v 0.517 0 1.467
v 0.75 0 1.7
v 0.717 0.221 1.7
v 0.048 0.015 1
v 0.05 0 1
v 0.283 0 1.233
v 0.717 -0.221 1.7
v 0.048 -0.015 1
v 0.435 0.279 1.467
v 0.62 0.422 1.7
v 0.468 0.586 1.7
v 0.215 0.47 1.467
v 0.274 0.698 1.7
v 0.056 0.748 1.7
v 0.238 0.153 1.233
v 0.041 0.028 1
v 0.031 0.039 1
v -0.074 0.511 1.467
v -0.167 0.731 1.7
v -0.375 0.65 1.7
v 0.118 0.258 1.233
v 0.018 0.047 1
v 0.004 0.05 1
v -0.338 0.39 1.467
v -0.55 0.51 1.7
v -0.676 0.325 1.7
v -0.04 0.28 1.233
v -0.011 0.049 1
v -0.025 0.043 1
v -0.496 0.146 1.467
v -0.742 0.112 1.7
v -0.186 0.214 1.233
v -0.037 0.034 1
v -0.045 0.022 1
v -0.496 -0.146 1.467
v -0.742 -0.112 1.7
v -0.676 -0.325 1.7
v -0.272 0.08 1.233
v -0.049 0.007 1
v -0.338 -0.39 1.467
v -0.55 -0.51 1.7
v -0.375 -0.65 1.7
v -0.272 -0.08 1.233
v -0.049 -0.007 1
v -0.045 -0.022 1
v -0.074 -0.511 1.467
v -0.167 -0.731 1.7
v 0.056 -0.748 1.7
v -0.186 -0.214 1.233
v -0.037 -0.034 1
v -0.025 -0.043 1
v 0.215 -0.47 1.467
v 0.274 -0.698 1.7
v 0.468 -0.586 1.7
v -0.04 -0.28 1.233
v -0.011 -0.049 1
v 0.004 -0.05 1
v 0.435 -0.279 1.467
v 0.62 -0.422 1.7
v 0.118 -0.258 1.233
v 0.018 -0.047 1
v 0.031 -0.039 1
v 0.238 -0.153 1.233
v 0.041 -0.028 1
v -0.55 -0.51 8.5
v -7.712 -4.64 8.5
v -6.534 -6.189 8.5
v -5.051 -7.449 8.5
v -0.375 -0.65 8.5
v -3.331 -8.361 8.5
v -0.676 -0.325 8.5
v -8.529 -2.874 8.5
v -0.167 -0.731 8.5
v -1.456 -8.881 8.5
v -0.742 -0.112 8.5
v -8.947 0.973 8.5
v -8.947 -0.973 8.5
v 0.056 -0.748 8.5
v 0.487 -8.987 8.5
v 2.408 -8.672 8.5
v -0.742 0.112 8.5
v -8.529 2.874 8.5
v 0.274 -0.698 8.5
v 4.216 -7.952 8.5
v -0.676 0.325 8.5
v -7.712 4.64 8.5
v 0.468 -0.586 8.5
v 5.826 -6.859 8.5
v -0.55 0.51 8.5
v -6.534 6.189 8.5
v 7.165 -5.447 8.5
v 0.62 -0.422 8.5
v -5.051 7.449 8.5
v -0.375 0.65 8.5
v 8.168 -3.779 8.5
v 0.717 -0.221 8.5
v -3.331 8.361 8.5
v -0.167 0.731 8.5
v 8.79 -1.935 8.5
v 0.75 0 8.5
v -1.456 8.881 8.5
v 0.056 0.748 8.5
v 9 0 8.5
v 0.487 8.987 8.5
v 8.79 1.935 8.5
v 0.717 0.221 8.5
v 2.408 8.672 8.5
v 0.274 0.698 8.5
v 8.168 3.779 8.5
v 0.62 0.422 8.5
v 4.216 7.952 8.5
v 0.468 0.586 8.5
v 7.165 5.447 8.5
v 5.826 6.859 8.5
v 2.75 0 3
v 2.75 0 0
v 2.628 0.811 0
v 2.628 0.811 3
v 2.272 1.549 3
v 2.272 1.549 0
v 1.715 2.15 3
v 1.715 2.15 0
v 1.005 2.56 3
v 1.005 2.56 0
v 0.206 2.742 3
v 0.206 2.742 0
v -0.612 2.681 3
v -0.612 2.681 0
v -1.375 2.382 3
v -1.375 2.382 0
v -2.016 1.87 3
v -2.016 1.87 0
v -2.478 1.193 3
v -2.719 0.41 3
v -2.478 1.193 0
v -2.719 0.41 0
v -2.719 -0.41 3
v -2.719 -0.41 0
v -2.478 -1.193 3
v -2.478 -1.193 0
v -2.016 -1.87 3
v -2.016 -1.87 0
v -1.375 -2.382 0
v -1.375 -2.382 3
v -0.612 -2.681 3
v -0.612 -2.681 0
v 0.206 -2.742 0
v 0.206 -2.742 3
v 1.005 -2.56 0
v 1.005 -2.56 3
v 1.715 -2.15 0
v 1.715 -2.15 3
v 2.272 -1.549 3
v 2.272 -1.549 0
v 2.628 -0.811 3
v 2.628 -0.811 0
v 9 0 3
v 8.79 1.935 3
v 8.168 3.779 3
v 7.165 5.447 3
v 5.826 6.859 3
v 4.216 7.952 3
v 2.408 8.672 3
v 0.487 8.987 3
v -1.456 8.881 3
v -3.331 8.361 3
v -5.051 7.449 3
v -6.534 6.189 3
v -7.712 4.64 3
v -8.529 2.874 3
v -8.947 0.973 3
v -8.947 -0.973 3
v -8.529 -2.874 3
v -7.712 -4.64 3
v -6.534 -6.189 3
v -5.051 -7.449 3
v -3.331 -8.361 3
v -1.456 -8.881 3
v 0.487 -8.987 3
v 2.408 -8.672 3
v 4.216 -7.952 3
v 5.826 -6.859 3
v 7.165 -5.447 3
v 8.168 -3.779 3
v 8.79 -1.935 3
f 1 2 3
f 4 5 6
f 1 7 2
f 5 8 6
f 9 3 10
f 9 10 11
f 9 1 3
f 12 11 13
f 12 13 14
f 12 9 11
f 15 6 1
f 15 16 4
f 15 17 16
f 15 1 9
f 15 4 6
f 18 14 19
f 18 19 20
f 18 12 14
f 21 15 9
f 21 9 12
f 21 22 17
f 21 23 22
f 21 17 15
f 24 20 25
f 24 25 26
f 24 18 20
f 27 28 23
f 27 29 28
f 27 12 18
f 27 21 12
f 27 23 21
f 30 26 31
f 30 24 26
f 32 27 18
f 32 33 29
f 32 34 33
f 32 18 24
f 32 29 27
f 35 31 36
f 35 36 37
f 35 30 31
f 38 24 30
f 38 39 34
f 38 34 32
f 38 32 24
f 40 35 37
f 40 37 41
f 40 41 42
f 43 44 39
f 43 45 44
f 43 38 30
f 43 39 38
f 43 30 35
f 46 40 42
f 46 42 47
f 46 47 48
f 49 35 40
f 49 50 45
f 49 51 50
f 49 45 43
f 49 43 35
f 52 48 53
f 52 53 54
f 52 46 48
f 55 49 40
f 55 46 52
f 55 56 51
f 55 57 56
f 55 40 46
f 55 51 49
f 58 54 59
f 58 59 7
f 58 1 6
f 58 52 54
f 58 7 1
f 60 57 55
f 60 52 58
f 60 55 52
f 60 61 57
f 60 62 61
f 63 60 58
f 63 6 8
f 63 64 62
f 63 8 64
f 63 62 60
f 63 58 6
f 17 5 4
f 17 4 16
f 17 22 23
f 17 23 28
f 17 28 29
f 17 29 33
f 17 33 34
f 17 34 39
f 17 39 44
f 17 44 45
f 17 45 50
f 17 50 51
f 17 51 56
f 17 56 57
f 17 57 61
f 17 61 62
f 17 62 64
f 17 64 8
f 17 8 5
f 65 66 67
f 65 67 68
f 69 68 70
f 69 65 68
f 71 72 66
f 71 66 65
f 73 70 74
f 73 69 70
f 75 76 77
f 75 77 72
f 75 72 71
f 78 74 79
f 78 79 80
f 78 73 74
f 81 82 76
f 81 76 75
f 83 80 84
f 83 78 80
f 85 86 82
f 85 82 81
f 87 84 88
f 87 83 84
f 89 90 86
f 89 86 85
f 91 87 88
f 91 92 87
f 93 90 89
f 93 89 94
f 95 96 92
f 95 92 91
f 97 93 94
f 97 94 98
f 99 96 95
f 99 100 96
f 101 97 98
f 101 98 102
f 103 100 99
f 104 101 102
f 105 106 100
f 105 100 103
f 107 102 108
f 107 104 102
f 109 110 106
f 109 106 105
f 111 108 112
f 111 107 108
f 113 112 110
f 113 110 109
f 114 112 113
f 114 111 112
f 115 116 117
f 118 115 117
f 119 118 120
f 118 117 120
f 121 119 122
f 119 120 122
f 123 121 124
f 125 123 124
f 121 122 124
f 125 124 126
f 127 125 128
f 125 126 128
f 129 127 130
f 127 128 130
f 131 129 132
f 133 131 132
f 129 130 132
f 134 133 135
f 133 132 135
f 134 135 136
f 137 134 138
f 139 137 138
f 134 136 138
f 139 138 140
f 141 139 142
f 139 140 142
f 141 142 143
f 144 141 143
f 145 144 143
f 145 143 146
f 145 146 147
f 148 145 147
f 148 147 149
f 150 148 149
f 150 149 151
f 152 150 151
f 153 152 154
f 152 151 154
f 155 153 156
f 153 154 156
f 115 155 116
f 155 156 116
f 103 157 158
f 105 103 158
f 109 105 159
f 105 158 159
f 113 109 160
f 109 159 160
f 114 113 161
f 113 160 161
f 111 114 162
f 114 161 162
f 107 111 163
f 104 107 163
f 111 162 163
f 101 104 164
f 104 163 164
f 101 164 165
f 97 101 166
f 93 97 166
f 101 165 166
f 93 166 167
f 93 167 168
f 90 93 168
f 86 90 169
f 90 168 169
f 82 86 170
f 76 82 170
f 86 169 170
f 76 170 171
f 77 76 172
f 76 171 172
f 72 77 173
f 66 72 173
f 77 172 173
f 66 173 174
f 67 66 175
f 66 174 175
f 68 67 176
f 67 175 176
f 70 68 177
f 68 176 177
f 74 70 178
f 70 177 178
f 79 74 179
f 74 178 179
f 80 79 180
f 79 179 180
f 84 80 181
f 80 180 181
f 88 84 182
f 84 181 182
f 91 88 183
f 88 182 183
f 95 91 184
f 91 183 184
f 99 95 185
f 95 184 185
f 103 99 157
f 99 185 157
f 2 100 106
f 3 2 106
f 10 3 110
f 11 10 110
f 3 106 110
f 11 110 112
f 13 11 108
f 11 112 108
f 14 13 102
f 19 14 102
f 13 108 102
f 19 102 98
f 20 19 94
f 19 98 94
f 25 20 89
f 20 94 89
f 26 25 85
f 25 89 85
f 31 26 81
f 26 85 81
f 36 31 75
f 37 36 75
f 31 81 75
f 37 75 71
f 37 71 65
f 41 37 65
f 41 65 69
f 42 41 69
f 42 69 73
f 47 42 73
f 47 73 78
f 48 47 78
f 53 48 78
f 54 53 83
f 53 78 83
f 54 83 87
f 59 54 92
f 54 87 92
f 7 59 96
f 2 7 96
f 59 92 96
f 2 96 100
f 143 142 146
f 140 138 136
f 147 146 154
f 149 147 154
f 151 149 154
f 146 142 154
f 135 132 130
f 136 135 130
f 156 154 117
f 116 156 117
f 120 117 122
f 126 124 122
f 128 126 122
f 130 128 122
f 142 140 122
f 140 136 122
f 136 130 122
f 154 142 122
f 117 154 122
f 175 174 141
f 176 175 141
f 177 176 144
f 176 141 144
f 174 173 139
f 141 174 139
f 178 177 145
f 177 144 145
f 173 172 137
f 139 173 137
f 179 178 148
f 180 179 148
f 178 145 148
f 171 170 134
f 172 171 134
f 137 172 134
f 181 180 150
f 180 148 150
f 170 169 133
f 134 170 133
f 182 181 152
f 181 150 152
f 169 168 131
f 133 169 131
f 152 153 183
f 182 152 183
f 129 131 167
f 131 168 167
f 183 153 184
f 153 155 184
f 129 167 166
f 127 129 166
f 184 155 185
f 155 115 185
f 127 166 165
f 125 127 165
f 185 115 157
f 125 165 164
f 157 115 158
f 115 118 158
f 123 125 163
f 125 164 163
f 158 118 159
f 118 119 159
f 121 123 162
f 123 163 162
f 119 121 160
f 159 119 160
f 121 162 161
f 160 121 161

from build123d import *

# Parameters (mm, degrees)
SKETCH_1_R          = 2.75
EXTRUDE_1_DEPTH     = 3
SKETCH_2_R          = 9
EXTRUDE_2_DEPTH     = 5.5
SKETCH_3_R          = 0.75
CUT_EXTRUDE_1_DEPTH = 7.5
CHAMFER_1_SIZE      = 0.7


with BuildPart() as part:
    # Эскиз1 → Бобышка-Вытянуть1 (new body)
    with BuildSketch(Plane.XY):
        Circle(SKETCH_1_R)
    extrude(amount=EXTRUDE_1_DEPTH)

    # Эскиз2 → Бобышка-Вытянуть2 (add)
    with BuildSketch(Plane.XY.offset(3)):
        Circle(SKETCH_2_R)
    extrude(amount=EXTRUDE_2_DEPTH)

    # Эскиз3 → Вырез-Вытянуть1 (cut)
    with BuildSketch(Plane.XY.offset(8.5)):
        Circle(SKETCH_3_R)
    extrude(amount=-CUT_EXTRUDE_1_DEPTH, mode=Mode.SUBTRACT)

    # Фаска1
    chamfer_1_edges = [part.edges().sort_by_distance(p)[0] for p in [
        (-0.75, 0, 1),
    ]]
    chamfer(chamfer_1_edges, length=CHAMFER_1_SIZE)


solid = part.part
